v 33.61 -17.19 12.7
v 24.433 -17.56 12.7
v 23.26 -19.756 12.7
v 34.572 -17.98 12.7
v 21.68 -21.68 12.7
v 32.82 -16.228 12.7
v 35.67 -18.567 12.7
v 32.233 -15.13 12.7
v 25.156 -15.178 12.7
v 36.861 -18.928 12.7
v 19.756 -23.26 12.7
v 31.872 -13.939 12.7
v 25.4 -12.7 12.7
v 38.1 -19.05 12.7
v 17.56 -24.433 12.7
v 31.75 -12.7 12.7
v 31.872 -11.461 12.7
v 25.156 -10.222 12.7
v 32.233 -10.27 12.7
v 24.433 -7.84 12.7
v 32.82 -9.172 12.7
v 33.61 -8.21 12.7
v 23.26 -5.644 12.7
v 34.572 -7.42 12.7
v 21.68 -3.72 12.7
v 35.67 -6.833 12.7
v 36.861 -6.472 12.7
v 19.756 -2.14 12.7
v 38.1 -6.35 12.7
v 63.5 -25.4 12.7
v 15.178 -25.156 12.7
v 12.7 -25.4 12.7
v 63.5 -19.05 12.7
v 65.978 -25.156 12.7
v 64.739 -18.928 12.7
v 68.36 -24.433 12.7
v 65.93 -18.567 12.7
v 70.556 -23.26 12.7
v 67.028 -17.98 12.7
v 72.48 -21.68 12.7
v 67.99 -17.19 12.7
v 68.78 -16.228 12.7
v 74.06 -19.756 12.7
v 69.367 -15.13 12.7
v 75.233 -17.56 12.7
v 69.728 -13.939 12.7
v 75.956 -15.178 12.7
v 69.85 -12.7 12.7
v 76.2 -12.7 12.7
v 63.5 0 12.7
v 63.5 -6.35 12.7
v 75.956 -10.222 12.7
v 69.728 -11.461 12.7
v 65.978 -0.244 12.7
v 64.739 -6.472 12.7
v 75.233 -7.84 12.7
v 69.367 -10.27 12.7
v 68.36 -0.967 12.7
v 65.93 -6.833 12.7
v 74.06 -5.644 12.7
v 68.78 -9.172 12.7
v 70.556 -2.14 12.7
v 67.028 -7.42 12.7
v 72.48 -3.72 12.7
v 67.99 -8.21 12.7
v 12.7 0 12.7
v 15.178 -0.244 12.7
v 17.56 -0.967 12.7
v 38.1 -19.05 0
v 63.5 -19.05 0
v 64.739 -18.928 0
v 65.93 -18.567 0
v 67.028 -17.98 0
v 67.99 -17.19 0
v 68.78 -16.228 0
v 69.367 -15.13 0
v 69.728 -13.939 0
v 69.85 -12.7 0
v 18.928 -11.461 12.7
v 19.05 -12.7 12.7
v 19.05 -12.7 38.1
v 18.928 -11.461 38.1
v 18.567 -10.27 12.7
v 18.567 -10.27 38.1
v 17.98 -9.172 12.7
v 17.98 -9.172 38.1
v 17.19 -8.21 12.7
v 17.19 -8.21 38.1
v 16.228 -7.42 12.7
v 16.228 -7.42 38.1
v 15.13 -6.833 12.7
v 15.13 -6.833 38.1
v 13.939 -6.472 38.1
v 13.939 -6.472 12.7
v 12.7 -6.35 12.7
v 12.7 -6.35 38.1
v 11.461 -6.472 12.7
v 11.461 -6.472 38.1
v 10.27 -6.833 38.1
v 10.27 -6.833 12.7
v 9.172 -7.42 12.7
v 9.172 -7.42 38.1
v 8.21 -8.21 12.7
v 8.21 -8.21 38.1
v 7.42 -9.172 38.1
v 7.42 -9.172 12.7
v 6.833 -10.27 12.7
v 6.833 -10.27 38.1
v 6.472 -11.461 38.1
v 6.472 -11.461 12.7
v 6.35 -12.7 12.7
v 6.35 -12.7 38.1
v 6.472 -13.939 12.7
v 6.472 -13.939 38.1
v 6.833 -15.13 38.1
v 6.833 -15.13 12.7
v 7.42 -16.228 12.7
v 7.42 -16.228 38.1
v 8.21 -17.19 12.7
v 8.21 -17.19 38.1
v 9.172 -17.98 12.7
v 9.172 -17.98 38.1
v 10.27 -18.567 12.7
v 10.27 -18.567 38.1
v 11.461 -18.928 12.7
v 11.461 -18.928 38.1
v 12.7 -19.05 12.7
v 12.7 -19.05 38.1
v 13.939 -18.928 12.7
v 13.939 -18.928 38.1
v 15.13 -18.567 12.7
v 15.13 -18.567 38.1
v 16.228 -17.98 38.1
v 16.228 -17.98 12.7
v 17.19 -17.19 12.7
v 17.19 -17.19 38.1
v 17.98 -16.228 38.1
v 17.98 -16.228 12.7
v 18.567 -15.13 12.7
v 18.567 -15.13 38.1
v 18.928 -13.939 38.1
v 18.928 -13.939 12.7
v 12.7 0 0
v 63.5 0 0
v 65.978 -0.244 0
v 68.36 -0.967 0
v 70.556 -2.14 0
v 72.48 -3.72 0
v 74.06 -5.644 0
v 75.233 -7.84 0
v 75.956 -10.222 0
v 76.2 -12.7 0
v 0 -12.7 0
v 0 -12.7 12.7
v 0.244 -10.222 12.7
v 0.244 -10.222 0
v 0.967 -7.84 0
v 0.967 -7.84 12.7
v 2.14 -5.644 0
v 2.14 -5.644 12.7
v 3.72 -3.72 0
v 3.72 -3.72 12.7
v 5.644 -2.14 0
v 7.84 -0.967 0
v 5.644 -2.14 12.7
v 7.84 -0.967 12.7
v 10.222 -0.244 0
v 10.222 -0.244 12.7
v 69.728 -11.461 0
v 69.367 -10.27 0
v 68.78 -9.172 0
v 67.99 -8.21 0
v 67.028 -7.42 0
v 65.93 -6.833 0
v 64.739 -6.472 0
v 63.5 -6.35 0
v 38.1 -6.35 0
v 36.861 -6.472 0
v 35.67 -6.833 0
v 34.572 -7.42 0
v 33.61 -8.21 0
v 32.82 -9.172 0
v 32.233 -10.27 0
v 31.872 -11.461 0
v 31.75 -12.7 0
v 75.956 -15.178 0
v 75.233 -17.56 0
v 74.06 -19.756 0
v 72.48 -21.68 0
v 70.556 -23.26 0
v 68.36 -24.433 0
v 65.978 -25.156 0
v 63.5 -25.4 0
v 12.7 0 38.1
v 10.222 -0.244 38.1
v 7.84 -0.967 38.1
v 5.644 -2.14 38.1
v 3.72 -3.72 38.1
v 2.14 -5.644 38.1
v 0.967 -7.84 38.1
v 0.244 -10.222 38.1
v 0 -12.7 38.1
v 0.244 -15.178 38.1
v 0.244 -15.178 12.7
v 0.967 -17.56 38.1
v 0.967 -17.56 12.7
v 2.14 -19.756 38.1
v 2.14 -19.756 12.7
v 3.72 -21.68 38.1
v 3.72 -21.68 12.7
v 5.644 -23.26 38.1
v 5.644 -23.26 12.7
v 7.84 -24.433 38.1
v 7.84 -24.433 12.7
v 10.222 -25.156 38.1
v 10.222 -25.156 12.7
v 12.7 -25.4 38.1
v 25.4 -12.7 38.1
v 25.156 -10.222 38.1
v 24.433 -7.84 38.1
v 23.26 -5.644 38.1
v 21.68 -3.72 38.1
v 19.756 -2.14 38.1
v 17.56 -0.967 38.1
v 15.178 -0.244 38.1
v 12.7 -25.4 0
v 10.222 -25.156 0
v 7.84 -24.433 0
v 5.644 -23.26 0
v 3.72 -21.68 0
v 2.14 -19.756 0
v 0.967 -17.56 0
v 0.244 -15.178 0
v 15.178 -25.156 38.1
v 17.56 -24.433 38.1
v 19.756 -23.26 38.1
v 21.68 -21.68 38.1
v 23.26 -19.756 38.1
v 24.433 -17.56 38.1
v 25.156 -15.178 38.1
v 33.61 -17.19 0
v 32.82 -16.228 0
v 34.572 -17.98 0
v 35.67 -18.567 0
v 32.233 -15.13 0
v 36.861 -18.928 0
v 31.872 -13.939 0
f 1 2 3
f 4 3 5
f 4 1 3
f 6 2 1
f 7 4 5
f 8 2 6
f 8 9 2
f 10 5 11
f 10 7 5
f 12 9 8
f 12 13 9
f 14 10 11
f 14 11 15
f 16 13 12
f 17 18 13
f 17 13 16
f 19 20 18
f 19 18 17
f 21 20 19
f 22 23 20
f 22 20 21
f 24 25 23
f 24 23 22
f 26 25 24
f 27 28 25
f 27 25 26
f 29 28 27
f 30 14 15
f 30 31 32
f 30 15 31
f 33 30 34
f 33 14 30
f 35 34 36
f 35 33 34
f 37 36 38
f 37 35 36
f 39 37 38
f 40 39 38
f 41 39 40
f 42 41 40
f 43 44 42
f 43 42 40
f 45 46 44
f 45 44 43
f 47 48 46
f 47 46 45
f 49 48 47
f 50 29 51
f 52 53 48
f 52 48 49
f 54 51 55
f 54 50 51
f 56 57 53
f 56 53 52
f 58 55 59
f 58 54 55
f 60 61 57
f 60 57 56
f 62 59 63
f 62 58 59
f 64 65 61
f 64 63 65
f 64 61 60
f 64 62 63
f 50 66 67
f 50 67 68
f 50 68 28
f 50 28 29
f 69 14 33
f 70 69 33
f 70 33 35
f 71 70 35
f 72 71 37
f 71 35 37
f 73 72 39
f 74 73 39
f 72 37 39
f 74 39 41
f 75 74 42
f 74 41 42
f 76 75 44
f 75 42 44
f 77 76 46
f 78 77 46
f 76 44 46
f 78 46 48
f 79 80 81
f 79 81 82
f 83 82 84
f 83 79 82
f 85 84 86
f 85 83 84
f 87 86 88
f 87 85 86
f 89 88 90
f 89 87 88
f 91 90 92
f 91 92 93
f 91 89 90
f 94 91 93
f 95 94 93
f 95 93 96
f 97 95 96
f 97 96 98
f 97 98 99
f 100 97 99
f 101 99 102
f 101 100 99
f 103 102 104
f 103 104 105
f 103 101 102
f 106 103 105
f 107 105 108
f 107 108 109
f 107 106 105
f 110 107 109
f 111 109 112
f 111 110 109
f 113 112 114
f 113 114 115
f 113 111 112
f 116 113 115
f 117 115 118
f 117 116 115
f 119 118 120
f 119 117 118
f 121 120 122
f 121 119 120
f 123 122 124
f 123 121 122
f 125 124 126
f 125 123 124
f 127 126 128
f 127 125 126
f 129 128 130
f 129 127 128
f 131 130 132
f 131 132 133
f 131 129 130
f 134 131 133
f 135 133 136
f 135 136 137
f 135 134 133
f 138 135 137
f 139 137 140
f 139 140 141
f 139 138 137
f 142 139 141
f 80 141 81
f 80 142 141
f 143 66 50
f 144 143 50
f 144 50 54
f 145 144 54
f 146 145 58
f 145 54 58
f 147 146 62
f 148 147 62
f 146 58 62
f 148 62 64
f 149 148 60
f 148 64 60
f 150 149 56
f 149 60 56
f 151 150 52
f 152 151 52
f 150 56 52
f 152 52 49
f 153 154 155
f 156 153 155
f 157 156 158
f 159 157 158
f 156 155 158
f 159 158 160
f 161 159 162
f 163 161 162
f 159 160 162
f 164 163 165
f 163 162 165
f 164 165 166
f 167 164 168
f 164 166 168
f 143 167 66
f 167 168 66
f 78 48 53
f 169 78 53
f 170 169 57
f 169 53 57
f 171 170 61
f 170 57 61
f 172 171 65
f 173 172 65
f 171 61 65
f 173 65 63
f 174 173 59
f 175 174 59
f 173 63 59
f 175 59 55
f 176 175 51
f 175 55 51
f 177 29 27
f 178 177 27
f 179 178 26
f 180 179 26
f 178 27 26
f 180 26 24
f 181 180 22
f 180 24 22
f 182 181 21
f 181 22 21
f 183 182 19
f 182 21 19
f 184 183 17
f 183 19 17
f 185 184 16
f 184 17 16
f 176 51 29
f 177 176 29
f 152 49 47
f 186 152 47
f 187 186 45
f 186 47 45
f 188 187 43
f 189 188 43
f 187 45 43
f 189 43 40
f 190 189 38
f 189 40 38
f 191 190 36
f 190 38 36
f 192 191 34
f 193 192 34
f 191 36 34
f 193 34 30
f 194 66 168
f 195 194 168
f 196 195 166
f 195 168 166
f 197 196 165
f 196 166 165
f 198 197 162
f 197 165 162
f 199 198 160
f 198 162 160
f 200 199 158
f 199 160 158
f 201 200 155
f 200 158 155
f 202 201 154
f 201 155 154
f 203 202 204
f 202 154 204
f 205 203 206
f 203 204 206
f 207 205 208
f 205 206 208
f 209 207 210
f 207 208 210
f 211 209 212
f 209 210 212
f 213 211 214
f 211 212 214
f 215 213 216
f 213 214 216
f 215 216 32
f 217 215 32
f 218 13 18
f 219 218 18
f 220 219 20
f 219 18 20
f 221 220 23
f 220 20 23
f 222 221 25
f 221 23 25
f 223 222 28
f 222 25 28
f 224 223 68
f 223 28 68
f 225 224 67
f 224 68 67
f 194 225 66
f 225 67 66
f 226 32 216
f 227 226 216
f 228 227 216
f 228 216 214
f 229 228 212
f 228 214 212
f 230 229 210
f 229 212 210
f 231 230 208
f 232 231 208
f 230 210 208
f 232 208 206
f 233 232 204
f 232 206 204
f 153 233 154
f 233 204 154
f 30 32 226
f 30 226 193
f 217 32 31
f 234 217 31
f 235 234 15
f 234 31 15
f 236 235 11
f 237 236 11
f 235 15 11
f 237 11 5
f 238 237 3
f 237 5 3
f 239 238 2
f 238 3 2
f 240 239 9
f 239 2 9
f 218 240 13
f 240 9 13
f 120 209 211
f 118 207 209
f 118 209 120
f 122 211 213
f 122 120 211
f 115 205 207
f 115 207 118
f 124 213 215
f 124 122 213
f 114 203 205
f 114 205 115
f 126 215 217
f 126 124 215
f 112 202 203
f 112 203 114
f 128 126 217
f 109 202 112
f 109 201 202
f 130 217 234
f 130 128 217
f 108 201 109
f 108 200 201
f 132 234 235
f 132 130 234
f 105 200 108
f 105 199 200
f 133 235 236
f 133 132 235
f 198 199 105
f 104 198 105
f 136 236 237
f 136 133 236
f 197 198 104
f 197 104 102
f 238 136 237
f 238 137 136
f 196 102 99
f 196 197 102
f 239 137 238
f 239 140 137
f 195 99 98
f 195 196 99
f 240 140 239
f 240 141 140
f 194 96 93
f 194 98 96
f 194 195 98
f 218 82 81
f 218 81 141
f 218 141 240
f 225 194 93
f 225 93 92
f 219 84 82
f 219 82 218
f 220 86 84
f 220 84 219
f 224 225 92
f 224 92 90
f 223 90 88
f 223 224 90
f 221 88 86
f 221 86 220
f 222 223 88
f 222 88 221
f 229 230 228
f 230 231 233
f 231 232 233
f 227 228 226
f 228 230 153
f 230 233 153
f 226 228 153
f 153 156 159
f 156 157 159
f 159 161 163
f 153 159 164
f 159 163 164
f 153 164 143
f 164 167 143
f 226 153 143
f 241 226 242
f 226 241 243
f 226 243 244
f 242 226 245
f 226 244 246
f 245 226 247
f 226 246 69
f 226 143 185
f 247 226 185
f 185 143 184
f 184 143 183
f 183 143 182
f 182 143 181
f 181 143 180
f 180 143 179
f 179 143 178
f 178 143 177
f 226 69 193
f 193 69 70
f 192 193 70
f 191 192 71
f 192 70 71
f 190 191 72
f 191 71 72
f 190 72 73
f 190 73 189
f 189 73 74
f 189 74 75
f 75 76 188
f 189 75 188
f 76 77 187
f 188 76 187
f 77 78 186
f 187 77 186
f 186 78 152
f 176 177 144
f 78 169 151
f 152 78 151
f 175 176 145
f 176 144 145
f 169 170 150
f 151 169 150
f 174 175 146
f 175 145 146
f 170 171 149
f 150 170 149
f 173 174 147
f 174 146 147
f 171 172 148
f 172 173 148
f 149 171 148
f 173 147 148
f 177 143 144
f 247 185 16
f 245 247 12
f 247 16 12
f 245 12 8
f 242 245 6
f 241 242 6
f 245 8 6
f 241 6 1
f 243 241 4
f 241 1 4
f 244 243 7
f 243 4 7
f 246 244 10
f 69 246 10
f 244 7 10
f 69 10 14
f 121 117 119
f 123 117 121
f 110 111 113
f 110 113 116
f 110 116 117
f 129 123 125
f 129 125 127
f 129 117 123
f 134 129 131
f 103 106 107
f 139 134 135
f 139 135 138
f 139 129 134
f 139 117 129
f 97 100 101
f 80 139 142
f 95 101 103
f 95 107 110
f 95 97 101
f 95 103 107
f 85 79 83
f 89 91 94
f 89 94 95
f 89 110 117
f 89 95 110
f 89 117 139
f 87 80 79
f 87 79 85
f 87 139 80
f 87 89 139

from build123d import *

# Parameters (mm, degrees)
F0_W     = 76.2
F0_H     = 12.7
F1_DEPTH = 25.4
F3_DEPTH = 12.7
F4_R     = 6.35
F5_DEPTH = 25.4


# Not quite as in the source:
# - ends of sketch curves that miss each other by under 0.0002 mm in the source are joined


with BuildPart() as f1:
    # F0 (on Front) → F1 (new body)
    with BuildSketch(Plane.XZ):
        with Locations((38.1, 6.35)):
            Rectangle(F0_W, F0_H)
    extrude(amount=F1_DEPTH)

    # F2 (on face) → F3 (cut)
    with BuildSketch(Plane.XY.offset(12.7)):
        with BuildLine():
            Line((0, -25.4), (12.7, -25.4))
            ThreePointArc((12.7, -25.4), (3.7197438789, -21.6802561211), (0, -12.7))
            Line((0, -12.7), (0, -25.4))
        make_face()
        with BuildLine():
            ThreePointArc((0, -12.7), (3.7197438789, -3.7197438789), (12.7, 0))
            Line((12.7, 0), (0, 0))
            Line((0, 0), (0, -12.7))
        make_face()
        with BuildLine():
            ThreePointArc((63.5, -19.05), (57.15, -12.7), (63.5, -6.35))
            Line((63.5, -6.35), (38.0999993506, -6.35))
            ThreePointArc((38.0999993506, -6.35), (42.5901278309, -8.2098717099), (44.45, -12.7))
            ThreePointArc((44.45, -12.7), (42.5901280605, -17.1901280605), (38.1, -19.05))
            Line((38.1, -19.05), (63.5, -19.05))
        make_face()
        with BuildLine():
            Line((38.0999996753, -12.7), (38.0999993506, -6.35))
            ThreePointArc((38.0999993506, -6.35), (33.6098717099, -8.2098721691), (31.75, -12.7))
            Line((31.75, -12.7), (38.0999996753, -12.7))
        make_face()
        with BuildLine():
            ThreePointArc((31.75, -12.7), (33.6098719395, -17.1901280605), (38.1, -19.05))
            Line((38.1, -19.05), (38.0999996753, -12.7))
            Line((38.0999996753, -12.7), (31.75, -12.7))
        make_face()
        with BuildLine():
            ThreePointArc((44.45, -12.7), (42.5901278309, -8.2098717099), (38.0999993506, -6.35))
            Line((38.0999993506, -6.35), (38.0999996753, -12.7))
            Line((38.0999996753, -12.7), (38.1, -19.05))
            ThreePointArc((38.1, -19.05), (42.5901280605, -17.1901280605), (44.45, -12.7))
        make_face()
        with BuildLine():
            Line((63.5, -19.05), (63.5, -6.35))
            ThreePointArc((63.5, -6.35), (57.15, -12.7), (63.5, -19.05))
        make_face()
        with BuildLine():
            ThreePointArc((63.5, -19.05), (67.9901280605, -17.1901280605), (69.85, -12.7))
            ThreePointArc((69.85, -12.7), (67.9901280605, -8.2098719395), (63.5, -6.35))
            Line((63.5, -6.35), (63.5, -19.05))
        make_face()
        with BuildLine():
            Line((76.2, 0), (63.5, 0))
            ThreePointArc((63.5, 0), (72.4802561211, -3.7197438789), (76.2, -12.7))
            Line((76.2, -12.7), (76.2, 0))
        make_face()
        with BuildLine():
            ThreePointArc((76.2, -12.7), (72.4802561211, -21.6802561211), (63.5, -25.4))
            Line((63.5, -25.4), (76.2, -25.4))
            Line((76.2, -25.4), (76.2, -12.7))
        make_face()
    extrude(amount=-F3_DEPTH, mode=Mode.SUBTRACT)

    # F4 (on face) → F5 (join)
    with BuildSketch(Plane.XY.offset(12.7)):
        with BuildLine():
            ThreePointArc((12.7, -25.4), (21.6802561211, -21.6802561211), (25.4, -12.7))
            ThreePointArc((25.4, -12.7), (21.6802561211, -3.7197438789), (12.7, 0))
            ThreePointArc((12.7, 0), (0, -12.7), (12.7, -25.4))
        make_face()
        with Locations((12.7, -12.7)):
            Circle(F4_R, mode=Mode.SUBTRACT)
    extrude(amount=F5_DEPTH)


solid = f1.part
